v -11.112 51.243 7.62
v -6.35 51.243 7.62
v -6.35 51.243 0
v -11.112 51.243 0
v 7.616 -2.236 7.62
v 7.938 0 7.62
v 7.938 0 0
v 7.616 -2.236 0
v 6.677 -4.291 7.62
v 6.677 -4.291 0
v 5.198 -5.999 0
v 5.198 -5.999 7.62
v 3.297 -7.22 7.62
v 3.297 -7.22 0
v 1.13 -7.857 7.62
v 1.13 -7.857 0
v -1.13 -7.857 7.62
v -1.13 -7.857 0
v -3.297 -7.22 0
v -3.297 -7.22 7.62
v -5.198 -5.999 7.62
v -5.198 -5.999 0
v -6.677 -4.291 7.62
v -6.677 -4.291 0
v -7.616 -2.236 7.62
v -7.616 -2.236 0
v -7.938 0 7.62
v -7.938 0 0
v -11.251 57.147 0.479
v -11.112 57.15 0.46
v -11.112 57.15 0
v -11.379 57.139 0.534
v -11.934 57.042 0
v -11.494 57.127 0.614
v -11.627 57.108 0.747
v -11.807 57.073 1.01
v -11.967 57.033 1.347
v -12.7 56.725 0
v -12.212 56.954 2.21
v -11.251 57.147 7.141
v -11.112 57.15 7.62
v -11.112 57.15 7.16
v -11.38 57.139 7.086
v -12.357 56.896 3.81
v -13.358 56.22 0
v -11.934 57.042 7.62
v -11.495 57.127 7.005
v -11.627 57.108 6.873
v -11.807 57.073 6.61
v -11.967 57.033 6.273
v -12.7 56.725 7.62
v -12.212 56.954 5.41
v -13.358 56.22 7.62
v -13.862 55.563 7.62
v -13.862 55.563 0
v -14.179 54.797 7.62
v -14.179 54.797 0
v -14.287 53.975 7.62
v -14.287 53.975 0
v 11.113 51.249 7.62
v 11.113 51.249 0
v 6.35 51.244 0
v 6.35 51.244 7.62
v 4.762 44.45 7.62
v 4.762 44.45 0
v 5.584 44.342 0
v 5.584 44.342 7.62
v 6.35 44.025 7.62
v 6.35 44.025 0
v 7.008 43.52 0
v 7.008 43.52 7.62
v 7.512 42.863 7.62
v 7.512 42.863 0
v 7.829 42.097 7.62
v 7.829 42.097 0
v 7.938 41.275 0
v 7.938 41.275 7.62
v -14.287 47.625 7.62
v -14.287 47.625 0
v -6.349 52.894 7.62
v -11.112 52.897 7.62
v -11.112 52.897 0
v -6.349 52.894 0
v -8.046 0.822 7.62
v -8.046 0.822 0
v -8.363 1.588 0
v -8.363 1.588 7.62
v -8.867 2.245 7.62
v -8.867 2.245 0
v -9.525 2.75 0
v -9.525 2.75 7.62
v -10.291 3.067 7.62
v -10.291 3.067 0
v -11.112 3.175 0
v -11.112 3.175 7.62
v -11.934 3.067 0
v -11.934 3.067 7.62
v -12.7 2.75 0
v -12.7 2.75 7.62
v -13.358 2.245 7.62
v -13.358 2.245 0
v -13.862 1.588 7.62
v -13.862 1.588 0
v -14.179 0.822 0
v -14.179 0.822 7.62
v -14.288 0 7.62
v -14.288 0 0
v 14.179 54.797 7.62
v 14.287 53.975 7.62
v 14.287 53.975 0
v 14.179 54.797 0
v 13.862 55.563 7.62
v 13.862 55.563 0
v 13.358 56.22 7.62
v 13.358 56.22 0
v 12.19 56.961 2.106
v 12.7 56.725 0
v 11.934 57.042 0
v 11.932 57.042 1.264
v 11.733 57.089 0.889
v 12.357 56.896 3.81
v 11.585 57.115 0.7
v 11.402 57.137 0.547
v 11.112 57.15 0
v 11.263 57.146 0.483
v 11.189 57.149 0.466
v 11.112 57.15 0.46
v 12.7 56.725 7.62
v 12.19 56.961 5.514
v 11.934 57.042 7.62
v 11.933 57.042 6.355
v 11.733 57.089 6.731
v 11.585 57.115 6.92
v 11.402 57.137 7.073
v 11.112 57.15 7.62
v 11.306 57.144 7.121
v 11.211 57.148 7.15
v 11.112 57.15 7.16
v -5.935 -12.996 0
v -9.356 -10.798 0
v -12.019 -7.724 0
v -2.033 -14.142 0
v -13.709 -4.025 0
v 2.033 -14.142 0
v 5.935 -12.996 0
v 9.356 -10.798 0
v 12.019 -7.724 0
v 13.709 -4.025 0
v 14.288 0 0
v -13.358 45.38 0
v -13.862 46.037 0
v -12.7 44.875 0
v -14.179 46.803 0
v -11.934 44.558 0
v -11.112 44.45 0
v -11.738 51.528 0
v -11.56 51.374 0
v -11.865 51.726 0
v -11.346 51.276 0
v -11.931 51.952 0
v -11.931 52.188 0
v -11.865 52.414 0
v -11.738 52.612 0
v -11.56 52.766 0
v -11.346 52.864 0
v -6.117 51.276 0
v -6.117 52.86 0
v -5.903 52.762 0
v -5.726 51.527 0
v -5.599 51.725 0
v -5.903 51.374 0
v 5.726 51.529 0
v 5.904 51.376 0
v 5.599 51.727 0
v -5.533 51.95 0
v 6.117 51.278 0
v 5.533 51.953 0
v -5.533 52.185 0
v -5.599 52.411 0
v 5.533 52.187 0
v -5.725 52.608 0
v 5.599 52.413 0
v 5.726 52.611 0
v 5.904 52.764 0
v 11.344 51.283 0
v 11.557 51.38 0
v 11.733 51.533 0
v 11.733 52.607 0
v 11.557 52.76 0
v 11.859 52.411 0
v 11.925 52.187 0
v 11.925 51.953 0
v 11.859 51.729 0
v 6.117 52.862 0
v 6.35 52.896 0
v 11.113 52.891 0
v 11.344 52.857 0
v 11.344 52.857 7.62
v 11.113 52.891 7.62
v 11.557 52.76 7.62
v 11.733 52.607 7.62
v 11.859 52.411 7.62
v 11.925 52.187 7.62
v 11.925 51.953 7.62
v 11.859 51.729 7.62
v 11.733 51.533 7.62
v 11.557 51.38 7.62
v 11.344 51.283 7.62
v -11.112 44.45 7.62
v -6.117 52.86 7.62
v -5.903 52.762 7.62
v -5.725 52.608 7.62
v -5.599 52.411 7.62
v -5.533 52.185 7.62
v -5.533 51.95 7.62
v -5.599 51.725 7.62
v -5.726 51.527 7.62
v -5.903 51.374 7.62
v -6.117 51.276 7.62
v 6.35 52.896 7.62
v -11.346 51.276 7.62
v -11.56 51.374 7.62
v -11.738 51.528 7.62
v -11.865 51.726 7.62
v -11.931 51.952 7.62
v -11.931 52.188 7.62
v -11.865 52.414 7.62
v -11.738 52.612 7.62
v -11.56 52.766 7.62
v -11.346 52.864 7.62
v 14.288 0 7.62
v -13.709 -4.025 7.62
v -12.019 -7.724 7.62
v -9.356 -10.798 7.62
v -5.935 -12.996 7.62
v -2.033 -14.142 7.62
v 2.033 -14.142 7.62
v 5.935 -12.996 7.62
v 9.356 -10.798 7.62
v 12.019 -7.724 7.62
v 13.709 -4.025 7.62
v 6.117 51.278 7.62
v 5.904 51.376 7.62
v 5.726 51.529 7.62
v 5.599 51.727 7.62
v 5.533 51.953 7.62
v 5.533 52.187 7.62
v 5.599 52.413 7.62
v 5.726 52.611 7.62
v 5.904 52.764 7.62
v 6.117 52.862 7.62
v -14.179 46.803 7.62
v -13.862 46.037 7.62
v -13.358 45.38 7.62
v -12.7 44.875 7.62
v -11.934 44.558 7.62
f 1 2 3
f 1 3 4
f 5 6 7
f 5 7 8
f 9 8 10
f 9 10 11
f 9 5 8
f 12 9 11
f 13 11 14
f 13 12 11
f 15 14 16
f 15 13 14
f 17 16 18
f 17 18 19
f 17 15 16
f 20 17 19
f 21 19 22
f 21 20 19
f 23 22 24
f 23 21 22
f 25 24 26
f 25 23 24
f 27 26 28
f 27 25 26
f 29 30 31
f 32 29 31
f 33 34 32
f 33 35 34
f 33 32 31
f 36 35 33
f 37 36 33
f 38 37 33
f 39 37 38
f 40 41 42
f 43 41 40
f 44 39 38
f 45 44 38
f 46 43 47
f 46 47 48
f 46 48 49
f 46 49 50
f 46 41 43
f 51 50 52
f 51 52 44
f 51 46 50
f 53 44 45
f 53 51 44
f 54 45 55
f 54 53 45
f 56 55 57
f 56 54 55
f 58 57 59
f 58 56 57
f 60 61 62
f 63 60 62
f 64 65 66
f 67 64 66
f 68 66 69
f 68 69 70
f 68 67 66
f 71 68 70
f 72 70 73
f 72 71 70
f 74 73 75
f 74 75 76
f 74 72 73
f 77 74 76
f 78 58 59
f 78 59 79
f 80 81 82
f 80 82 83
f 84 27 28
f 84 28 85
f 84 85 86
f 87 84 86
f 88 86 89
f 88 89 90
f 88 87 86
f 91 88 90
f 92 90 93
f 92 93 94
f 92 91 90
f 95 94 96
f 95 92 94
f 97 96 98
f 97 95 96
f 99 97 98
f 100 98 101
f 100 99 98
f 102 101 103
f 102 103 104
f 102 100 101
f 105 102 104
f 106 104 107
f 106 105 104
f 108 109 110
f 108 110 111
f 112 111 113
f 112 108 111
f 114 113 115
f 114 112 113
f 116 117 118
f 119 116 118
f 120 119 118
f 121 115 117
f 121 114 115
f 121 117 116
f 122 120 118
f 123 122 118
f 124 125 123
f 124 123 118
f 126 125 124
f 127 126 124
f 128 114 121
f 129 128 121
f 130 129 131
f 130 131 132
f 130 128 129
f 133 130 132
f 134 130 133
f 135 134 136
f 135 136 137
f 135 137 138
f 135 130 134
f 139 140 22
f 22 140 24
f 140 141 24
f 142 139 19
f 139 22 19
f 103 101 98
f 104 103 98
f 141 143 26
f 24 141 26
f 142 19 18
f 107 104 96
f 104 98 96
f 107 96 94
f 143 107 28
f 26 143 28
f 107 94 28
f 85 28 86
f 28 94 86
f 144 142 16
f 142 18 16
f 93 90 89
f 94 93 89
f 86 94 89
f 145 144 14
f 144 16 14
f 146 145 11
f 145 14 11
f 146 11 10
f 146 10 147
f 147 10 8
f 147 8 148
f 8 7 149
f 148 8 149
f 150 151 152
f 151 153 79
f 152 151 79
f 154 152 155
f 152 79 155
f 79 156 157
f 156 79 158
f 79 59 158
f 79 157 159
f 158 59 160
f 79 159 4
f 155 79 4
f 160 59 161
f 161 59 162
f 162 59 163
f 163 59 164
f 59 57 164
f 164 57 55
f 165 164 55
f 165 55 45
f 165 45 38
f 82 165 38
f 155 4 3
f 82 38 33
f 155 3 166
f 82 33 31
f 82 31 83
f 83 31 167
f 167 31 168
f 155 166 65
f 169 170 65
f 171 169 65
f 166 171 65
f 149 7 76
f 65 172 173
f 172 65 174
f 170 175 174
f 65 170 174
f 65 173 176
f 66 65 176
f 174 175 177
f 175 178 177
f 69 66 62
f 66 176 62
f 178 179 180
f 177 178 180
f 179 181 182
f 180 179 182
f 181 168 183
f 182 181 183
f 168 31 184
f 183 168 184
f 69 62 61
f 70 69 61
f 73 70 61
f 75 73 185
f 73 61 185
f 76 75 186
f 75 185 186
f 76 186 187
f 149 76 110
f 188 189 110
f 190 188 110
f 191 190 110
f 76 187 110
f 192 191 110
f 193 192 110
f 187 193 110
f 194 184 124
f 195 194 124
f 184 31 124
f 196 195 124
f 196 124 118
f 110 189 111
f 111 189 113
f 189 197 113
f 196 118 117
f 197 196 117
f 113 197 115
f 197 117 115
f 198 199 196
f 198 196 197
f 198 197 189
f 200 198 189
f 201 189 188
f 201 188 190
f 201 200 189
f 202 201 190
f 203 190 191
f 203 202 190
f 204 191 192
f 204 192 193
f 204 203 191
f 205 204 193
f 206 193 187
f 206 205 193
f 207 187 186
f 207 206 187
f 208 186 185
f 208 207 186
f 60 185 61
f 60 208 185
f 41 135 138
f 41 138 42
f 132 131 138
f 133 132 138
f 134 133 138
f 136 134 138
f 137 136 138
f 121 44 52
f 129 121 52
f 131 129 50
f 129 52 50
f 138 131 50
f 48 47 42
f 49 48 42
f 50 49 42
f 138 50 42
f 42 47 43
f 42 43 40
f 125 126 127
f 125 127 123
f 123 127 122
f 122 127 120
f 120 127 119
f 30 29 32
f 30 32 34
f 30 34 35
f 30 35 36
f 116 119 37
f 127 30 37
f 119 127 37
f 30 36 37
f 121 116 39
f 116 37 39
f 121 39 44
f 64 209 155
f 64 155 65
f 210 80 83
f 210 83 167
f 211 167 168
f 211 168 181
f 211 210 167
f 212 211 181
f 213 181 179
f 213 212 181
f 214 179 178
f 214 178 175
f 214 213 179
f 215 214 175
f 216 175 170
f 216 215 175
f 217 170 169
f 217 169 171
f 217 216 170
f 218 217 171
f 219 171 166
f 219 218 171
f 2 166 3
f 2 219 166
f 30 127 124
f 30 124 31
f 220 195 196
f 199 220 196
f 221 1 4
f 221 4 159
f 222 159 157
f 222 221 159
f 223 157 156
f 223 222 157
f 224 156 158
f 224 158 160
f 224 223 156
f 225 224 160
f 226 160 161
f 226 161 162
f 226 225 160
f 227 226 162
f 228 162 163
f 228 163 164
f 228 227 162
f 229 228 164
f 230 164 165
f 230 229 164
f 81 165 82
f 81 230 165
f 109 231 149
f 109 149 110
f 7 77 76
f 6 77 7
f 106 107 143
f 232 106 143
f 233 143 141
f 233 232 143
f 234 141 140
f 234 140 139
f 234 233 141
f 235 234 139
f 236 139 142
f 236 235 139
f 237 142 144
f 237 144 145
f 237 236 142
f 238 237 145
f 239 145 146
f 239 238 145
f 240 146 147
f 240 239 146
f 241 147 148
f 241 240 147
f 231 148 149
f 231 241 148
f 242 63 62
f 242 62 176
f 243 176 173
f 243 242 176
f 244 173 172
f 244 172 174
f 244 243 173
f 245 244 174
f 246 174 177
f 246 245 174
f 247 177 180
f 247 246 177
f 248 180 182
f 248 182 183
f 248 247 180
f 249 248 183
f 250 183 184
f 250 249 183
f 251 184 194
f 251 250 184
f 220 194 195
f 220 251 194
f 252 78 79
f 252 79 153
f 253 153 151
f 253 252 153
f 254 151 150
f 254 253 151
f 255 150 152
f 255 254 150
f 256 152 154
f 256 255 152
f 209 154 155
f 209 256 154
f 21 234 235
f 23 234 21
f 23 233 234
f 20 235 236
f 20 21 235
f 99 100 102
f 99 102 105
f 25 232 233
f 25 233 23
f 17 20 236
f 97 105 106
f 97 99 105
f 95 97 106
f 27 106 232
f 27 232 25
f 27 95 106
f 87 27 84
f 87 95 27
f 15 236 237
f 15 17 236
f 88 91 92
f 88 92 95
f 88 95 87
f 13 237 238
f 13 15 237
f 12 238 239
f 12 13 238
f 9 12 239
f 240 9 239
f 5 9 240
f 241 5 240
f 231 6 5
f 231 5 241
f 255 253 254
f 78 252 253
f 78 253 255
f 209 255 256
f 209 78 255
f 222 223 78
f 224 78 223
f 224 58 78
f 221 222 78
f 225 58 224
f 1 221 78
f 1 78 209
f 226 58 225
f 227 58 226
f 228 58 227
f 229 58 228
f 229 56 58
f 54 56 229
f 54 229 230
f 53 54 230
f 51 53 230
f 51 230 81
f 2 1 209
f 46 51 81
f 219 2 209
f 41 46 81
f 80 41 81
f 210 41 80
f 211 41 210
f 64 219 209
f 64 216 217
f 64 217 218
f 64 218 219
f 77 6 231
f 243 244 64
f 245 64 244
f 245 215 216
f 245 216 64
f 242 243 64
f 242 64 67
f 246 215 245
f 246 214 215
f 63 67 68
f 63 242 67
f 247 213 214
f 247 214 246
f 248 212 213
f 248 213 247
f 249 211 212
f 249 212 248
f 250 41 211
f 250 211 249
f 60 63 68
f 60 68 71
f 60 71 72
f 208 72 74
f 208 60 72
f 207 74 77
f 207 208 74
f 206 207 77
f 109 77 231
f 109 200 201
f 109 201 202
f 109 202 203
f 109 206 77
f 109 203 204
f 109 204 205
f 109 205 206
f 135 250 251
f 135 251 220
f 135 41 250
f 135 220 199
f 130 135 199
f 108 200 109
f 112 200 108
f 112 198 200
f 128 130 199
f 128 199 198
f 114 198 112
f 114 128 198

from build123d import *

# Parameters (mm, degrees)
F1_DEPTH = 3.81
F2_R     = 22.225
F3_DEPTH = 109
F4_DEPTH = 28.576


# Not quite as in the source:
# - an extrude ends at something that could not be found from the text; its depth is read off the source's solid
# - a pattern or mirror of a feature is missing from the dataset's text; its kind, count and spacing are read off the source's solid


with BuildPart() as f1:
    # F0 (on Top) → F1 (new body)
    with BuildSketch(Plane.XY):
        with BuildLine():
            ThreePointArc((7.9375, 0), (0, -7.9375), (-7.9375, 0))
            ThreePointArc((-7.9375, 0), (-8.8674359697, 2.2450640303), (-11.1125, 3.175))
            ThreePointArc((-11.1125, 3.175), (-13.3575640303, 2.2450640303), (-14.2875, 0))
            ThreePointArc((-14.2875, 0), (0, -14.2875), (14.2875, 0))
            Line((14.2875, 0), (14.2875, 53.975))
            ThreePointArc((14.2875, 53.975), (13.3575640303, 56.2200640303), (11.1125, 57.15))
            Line((11.1125, 57.15), (-11.1125, 57.15))
            ThreePointArc((-11.1125, 57.15), (-13.3575640303, 56.2200640303), (-14.2875, 53.975))
            Line((-14.2875, 53.975), (-14.2875, 47.625))
            ThreePointArc((-14.2875, 47.625), (-13.3575640303, 45.3799359697), (-11.1125, 44.45))
            Line((-11.1125, 44.45), (4.7625, 44.45))
            ThreePointArc((4.7625, 44.45), (7.0075640303, 43.5200640303), (7.9375, 41.275))
            Line((7.9375, 41.275), (7.9375, 0))
        make_face()
        with BuildLine():
            ThreePointArc((-11.1125, 51.2426083993), (-11.9398916007, 52.07), (-11.1125, 52.8973916007))
            Line((-11.1125, 52.8973916007), (-6.3490160938, 52.8936081389))
            ThreePointArc((-6.3490160938, 52.8936081389), (-5.5241718233, 52.0677805671), (-6.3496717582, 51.2426083993))
            Line((-6.3496717582, 51.2426083993), (-11.1125, 51.2426083993))
        make_face(mode=Mode.SUBTRACT)
        with BuildLine():
            ThreePointArc((11.1133453348, 52.8905930346), (11.93309347, 52.07), (11.1133453348, 51.2494069654))
            Line((11.1133453348, 51.2494069654), (6.35, 51.2445))
            ThreePointArc((6.35, 51.2445), (5.5245, 52.07), (6.35, 52.8955))
            Line((6.35, 52.8955), (11.1133453348, 52.8905930346))
        make_face(mode=Mode.SUBTRACT)
    extrude(amount=F1_DEPTH)

    # F1_copies: F1 across plane


with BuildPart() as f1_1:
    add(f1.part)
    add(f1.part.mirror(Plane.XY.offset(3.81)))

    # F2 (on face) → F3 (cut, through all)
    with BuildSketch(Plane(origin=(-14.2875, 0, 0), x_dir=(0, -1, 0), z_dir=(-1, 0, 0))):
        with Locations((79.121, 3.81)):
            Circle(F2_R)
        with BuildLine():
            ThreePointArc((-57.15, 0.4595098866), (-56.9595909744, 2.1299479175), (-56.896, 3.81))
            ThreePointArc((-56.896, 3.81), (-101.2824090256, 5.4900520825), (-57.15, 0.4595098866))
        make_face()
    extrude(amount=F3_DEPTH, mode=Mode.SUBTRACT)

    # F2 (on face) → F4 (cut, through all)
    with BuildSketch(Plane(origin=(-14.2875, 0, 0), x_dir=(0, -1, 0), z_dir=(-1, 0, 0))):
        with Locations((79.121, 3.81)):
            Circle(F2_R)
        with BuildLine():
            ThreePointArc((-57.15, 0.4595098866), (-56.9595909744, 2.1299479175), (-56.896, 3.81))
            ThreePointArc((-56.896, 3.81), (-101.2824090256, 5.4900520825), (-57.15, 0.4595098866))
        make_face()
    extrude(amount=-F4_DEPTH, mode=Mode.SUBTRACT)


solid = f1_1.part
